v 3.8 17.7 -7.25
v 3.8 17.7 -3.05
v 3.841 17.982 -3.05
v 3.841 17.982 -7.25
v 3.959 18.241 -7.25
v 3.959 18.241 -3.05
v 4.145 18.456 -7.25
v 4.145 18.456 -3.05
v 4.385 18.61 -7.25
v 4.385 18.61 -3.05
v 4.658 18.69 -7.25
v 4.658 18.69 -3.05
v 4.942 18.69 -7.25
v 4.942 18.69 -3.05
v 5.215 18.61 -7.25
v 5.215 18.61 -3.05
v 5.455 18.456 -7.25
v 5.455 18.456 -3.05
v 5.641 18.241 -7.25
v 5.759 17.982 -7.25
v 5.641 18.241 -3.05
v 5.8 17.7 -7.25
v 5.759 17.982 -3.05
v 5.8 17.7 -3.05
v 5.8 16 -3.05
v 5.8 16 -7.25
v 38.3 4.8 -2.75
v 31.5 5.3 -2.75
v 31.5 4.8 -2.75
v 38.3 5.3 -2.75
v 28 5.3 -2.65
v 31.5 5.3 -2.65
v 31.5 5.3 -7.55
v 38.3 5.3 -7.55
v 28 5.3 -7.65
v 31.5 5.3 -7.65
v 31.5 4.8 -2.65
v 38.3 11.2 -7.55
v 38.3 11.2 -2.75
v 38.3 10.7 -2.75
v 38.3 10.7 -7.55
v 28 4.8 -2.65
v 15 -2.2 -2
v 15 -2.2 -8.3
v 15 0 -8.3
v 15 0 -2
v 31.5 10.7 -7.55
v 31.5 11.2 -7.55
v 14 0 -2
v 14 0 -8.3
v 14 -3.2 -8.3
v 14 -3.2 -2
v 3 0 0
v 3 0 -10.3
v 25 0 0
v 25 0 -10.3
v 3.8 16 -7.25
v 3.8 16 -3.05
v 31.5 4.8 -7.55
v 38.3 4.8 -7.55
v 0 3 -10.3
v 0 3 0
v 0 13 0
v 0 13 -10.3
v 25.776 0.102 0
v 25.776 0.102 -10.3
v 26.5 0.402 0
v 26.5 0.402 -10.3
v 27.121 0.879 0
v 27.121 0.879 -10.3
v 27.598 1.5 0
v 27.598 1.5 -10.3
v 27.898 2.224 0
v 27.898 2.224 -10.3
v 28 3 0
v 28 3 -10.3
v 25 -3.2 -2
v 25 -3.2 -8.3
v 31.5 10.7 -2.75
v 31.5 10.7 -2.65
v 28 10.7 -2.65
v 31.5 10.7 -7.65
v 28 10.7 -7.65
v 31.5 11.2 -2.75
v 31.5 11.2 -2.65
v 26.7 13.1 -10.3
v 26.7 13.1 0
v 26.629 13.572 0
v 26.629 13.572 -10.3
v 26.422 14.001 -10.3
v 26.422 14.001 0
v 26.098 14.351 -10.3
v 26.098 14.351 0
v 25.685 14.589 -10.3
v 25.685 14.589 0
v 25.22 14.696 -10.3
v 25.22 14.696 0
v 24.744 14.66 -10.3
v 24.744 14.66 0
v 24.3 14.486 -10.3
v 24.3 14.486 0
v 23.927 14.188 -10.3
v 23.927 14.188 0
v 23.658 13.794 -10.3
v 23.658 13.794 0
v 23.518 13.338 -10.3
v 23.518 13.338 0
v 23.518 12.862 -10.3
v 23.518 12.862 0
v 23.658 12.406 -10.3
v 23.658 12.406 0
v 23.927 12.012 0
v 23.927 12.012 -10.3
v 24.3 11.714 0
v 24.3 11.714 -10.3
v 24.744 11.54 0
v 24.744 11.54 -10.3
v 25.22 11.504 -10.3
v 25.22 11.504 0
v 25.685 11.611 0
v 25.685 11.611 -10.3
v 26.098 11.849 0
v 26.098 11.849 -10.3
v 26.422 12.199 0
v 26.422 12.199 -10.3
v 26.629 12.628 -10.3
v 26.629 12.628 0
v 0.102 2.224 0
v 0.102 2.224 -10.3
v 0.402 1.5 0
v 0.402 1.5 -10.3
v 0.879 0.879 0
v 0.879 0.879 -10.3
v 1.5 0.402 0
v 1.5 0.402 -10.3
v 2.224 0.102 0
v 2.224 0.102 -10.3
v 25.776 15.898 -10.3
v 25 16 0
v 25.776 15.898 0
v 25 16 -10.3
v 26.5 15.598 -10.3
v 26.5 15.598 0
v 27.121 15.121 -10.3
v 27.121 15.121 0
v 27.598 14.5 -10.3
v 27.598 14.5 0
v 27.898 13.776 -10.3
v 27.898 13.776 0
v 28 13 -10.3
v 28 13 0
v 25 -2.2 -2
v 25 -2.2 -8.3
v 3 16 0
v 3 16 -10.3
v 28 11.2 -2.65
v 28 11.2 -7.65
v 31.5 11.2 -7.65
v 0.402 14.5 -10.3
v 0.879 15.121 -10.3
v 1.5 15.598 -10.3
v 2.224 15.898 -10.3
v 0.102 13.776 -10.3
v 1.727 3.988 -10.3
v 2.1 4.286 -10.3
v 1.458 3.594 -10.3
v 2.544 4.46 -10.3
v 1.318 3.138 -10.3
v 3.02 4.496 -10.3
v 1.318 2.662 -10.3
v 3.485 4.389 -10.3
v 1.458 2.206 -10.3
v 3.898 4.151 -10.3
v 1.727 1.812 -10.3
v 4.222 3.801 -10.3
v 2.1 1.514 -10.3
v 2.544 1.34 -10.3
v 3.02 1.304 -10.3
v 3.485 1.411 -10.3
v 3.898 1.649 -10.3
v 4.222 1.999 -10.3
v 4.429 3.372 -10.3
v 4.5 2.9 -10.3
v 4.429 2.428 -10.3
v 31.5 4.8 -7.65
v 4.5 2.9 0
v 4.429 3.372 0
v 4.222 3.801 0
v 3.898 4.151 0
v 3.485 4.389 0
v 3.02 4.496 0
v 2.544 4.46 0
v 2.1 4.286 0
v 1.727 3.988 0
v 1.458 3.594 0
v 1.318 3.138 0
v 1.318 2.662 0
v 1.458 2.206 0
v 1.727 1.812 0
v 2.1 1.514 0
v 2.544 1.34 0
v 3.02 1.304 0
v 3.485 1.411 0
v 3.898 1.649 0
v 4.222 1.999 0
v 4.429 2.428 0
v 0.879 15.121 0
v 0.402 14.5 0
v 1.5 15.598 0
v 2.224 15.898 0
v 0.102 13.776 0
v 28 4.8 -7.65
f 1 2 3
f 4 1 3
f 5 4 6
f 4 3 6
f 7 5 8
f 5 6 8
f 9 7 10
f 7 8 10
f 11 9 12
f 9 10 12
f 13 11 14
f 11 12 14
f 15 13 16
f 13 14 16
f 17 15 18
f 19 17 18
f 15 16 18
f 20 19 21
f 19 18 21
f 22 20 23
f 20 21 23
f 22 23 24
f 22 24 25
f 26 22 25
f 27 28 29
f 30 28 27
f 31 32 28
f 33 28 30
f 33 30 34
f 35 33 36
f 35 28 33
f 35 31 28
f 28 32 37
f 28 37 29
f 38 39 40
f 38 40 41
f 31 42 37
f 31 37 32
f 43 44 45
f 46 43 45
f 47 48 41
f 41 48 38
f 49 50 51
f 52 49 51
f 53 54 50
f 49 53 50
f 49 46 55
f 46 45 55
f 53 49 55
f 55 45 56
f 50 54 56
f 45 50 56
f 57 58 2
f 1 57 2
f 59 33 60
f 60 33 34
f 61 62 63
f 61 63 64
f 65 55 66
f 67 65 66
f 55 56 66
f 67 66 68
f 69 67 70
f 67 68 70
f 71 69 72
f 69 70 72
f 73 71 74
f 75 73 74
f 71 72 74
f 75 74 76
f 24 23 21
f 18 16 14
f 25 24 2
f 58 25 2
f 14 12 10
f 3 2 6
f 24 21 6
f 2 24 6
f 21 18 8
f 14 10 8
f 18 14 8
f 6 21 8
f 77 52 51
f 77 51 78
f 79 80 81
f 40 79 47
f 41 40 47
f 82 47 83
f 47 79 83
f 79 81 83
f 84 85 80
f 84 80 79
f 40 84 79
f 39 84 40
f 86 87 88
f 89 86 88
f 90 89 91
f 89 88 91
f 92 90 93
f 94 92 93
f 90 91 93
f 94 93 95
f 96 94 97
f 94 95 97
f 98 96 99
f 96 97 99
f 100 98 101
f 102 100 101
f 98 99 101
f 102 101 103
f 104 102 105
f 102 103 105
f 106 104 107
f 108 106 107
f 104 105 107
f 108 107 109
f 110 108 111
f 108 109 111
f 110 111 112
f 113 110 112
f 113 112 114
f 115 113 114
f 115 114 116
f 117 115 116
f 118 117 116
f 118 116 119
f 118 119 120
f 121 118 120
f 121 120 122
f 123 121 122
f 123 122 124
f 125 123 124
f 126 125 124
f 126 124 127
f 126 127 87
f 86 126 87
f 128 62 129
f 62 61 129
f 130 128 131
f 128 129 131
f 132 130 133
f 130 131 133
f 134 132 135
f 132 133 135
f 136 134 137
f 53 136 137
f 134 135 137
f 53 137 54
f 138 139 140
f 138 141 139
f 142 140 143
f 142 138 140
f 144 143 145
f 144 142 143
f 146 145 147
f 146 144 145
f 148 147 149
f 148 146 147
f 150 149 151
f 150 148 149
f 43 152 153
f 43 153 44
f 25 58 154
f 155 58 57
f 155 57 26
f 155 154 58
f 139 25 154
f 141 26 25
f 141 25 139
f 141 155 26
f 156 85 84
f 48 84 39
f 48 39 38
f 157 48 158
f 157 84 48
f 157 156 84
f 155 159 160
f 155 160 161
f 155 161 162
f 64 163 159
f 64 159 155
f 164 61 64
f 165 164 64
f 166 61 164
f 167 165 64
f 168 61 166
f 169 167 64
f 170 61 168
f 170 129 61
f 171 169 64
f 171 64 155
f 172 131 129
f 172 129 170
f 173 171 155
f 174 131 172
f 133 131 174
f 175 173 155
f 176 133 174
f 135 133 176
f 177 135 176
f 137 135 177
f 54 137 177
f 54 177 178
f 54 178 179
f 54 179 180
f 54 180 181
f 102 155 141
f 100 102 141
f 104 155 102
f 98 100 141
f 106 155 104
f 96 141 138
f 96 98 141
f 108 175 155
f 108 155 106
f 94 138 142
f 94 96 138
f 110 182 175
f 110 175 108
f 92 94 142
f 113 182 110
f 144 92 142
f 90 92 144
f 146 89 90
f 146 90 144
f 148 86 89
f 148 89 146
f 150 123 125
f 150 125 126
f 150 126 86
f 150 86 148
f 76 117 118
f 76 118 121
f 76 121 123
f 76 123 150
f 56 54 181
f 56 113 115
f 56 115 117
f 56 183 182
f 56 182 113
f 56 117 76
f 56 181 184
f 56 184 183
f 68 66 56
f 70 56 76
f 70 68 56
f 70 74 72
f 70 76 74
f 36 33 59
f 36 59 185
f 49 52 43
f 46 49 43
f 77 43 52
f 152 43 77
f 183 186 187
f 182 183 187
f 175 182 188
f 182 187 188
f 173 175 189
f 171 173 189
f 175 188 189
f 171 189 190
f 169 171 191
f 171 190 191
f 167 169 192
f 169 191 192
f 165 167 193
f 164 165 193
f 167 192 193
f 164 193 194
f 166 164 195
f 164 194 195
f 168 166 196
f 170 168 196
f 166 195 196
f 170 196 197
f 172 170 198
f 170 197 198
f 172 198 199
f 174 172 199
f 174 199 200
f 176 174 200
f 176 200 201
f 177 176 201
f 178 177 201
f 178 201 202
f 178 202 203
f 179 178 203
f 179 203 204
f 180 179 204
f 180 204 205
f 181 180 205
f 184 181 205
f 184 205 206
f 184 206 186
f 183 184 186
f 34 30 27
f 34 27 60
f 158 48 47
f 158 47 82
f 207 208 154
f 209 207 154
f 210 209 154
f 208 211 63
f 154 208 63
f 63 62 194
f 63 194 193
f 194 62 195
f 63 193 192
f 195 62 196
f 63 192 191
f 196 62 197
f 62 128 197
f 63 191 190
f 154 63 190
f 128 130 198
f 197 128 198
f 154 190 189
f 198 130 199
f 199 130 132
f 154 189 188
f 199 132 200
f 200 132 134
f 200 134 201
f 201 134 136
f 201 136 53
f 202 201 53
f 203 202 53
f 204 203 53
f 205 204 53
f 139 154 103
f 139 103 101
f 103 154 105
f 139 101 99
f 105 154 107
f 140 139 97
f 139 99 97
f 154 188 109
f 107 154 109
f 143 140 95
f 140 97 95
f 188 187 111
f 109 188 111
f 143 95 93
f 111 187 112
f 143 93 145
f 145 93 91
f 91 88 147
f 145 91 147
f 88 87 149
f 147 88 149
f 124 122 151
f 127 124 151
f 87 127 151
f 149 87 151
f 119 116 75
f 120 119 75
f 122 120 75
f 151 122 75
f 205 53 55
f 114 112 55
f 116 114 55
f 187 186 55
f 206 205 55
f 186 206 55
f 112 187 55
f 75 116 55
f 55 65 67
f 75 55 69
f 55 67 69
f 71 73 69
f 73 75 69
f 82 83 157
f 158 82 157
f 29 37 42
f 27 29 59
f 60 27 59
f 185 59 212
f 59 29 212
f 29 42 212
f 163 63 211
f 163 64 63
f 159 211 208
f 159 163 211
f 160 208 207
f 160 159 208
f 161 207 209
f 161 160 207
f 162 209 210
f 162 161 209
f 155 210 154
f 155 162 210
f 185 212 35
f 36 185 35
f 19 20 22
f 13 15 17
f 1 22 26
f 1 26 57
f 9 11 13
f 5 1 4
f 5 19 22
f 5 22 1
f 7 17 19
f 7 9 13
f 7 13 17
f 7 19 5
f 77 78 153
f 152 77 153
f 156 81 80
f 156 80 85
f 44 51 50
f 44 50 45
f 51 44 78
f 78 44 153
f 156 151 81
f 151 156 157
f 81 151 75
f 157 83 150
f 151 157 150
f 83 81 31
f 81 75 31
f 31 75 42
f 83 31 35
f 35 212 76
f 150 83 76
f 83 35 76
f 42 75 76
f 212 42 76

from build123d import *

# Parameters (mm, degrees)
SKETCH_1_W          = 28
SKETCH_1_H          = 10.3
EXTRUDE_1_DEPTH     = 16
SKETCH_2_R          = 1.6
CUT_EXTRUDE_1_DEPTH = 16
FILLET_1_R          = 3
EXTRUDE_START       = -3.05
EXTRUDE_2_DEPTH     = 4.2
SKETCH_4_W          = 5
SKETCH_4_H          = 0.5
EXTRUDE_3_DEPTH     = 10.3
SKETCH_5_W          = 6.8
SKETCH_5_H          = 0.1
CUT_EXTRUDE_2_DEPTH = 12.2
EXTRUDE_START_2     = -2
EXTRUDE_4_DEPTH     = 6.3


with BuildPart() as part:
    # 草图1 → 凸台-拉伸1 (new body)
    with BuildSketch(Plane(origin=(0, 0, 0), x_dir=(1, 0, 0), z_dir=(0, 1, 0))):
        with Locations((14, 5.15)):
            Rectangle(SKETCH_1_W, SKETCH_1_H)
    extrude(amount=EXTRUDE_1_DEPTH)

    # 草图2 → 切除-拉伸1 (cut)
    with BuildSketch(Plane.XY):
        with Locations((2.9, 2.9)):
            Circle(SKETCH_2_R)
        with Locations((25.1, 13.1)):
            Circle(SKETCH_2_R)
    extrude(amount=-CUT_EXTRUDE_1_DEPTH, mode=Mode.SUBTRACT)

    # 圆角1
    fillet_1_edges = [part.edges().sort_by_distance(p)[0] for p in [
        (28, 16, -5.15),
        (0, 16, -5.15),
        (28, 0, -5.15),
        (0, 0, -5.15),
    ]]
    fillet(fillet_1_edges, radius=FILLET_1_R)

    # 草图3 → 凸台-拉伸2 (add)
    with BuildSketch(Plane.XY.offset(EXTRUDE_START)):
        with BuildLine():
            Line((3.8, 16), (3.8, 17.7))
            ThreePointArc((3.8, 17.7), (4.8, 18.7), (5.8, 17.7))
            Line((5.8, 17.7), (5.8, 16))
            Line((5.8, 16), (3.8, 16))
        make_face()
    extrude(amount=-EXTRUDE_2_DEPTH)

    # 草图4 → 凸台-拉伸3 (add)
    with BuildSketch(Plane(origin=(28, 0, 0), x_dir=(0, 0, -1), z_dir=(1, 0, 0))):
        with Locations((5.15, 10.95)):
            Rectangle(SKETCH_4_W, SKETCH_4_H)
        with Locations((5.15, 5.05)):
            Rectangle(SKETCH_4_W, SKETCH_4_H)
    extrude(amount=EXTRUDE_3_DEPTH)

    # 草图5 → 切除-拉伸2 (cut, through all)
    with BuildSketch(Plane(origin=(0, 11.2, 0), x_dir=(1, 0, 0), z_dir=(0, 1, 0))):
        with Locations((34.9, 7.6)):
            Rectangle(SKETCH_5_W, SKETCH_5_H)
        with Locations((34.9, 2.7)):
            Rectangle(SKETCH_5_W, SKETCH_5_H)
    extrude(amount=-CUT_EXTRUDE_2_DEPTH, mode=Mode.SUBTRACT)

    # 草图6 → 凸台-拉伸4 (add)
    with BuildSketch(Plane.XY.offset(EXTRUDE_START_2)):
        Polygon((14, 0), (14, -3.2), (25, -3.2), (25, -2.2), (15, -2.2), (15, 0), align=None)
    extrude(amount=-EXTRUDE_4_DEPTH)


solid = part.part
